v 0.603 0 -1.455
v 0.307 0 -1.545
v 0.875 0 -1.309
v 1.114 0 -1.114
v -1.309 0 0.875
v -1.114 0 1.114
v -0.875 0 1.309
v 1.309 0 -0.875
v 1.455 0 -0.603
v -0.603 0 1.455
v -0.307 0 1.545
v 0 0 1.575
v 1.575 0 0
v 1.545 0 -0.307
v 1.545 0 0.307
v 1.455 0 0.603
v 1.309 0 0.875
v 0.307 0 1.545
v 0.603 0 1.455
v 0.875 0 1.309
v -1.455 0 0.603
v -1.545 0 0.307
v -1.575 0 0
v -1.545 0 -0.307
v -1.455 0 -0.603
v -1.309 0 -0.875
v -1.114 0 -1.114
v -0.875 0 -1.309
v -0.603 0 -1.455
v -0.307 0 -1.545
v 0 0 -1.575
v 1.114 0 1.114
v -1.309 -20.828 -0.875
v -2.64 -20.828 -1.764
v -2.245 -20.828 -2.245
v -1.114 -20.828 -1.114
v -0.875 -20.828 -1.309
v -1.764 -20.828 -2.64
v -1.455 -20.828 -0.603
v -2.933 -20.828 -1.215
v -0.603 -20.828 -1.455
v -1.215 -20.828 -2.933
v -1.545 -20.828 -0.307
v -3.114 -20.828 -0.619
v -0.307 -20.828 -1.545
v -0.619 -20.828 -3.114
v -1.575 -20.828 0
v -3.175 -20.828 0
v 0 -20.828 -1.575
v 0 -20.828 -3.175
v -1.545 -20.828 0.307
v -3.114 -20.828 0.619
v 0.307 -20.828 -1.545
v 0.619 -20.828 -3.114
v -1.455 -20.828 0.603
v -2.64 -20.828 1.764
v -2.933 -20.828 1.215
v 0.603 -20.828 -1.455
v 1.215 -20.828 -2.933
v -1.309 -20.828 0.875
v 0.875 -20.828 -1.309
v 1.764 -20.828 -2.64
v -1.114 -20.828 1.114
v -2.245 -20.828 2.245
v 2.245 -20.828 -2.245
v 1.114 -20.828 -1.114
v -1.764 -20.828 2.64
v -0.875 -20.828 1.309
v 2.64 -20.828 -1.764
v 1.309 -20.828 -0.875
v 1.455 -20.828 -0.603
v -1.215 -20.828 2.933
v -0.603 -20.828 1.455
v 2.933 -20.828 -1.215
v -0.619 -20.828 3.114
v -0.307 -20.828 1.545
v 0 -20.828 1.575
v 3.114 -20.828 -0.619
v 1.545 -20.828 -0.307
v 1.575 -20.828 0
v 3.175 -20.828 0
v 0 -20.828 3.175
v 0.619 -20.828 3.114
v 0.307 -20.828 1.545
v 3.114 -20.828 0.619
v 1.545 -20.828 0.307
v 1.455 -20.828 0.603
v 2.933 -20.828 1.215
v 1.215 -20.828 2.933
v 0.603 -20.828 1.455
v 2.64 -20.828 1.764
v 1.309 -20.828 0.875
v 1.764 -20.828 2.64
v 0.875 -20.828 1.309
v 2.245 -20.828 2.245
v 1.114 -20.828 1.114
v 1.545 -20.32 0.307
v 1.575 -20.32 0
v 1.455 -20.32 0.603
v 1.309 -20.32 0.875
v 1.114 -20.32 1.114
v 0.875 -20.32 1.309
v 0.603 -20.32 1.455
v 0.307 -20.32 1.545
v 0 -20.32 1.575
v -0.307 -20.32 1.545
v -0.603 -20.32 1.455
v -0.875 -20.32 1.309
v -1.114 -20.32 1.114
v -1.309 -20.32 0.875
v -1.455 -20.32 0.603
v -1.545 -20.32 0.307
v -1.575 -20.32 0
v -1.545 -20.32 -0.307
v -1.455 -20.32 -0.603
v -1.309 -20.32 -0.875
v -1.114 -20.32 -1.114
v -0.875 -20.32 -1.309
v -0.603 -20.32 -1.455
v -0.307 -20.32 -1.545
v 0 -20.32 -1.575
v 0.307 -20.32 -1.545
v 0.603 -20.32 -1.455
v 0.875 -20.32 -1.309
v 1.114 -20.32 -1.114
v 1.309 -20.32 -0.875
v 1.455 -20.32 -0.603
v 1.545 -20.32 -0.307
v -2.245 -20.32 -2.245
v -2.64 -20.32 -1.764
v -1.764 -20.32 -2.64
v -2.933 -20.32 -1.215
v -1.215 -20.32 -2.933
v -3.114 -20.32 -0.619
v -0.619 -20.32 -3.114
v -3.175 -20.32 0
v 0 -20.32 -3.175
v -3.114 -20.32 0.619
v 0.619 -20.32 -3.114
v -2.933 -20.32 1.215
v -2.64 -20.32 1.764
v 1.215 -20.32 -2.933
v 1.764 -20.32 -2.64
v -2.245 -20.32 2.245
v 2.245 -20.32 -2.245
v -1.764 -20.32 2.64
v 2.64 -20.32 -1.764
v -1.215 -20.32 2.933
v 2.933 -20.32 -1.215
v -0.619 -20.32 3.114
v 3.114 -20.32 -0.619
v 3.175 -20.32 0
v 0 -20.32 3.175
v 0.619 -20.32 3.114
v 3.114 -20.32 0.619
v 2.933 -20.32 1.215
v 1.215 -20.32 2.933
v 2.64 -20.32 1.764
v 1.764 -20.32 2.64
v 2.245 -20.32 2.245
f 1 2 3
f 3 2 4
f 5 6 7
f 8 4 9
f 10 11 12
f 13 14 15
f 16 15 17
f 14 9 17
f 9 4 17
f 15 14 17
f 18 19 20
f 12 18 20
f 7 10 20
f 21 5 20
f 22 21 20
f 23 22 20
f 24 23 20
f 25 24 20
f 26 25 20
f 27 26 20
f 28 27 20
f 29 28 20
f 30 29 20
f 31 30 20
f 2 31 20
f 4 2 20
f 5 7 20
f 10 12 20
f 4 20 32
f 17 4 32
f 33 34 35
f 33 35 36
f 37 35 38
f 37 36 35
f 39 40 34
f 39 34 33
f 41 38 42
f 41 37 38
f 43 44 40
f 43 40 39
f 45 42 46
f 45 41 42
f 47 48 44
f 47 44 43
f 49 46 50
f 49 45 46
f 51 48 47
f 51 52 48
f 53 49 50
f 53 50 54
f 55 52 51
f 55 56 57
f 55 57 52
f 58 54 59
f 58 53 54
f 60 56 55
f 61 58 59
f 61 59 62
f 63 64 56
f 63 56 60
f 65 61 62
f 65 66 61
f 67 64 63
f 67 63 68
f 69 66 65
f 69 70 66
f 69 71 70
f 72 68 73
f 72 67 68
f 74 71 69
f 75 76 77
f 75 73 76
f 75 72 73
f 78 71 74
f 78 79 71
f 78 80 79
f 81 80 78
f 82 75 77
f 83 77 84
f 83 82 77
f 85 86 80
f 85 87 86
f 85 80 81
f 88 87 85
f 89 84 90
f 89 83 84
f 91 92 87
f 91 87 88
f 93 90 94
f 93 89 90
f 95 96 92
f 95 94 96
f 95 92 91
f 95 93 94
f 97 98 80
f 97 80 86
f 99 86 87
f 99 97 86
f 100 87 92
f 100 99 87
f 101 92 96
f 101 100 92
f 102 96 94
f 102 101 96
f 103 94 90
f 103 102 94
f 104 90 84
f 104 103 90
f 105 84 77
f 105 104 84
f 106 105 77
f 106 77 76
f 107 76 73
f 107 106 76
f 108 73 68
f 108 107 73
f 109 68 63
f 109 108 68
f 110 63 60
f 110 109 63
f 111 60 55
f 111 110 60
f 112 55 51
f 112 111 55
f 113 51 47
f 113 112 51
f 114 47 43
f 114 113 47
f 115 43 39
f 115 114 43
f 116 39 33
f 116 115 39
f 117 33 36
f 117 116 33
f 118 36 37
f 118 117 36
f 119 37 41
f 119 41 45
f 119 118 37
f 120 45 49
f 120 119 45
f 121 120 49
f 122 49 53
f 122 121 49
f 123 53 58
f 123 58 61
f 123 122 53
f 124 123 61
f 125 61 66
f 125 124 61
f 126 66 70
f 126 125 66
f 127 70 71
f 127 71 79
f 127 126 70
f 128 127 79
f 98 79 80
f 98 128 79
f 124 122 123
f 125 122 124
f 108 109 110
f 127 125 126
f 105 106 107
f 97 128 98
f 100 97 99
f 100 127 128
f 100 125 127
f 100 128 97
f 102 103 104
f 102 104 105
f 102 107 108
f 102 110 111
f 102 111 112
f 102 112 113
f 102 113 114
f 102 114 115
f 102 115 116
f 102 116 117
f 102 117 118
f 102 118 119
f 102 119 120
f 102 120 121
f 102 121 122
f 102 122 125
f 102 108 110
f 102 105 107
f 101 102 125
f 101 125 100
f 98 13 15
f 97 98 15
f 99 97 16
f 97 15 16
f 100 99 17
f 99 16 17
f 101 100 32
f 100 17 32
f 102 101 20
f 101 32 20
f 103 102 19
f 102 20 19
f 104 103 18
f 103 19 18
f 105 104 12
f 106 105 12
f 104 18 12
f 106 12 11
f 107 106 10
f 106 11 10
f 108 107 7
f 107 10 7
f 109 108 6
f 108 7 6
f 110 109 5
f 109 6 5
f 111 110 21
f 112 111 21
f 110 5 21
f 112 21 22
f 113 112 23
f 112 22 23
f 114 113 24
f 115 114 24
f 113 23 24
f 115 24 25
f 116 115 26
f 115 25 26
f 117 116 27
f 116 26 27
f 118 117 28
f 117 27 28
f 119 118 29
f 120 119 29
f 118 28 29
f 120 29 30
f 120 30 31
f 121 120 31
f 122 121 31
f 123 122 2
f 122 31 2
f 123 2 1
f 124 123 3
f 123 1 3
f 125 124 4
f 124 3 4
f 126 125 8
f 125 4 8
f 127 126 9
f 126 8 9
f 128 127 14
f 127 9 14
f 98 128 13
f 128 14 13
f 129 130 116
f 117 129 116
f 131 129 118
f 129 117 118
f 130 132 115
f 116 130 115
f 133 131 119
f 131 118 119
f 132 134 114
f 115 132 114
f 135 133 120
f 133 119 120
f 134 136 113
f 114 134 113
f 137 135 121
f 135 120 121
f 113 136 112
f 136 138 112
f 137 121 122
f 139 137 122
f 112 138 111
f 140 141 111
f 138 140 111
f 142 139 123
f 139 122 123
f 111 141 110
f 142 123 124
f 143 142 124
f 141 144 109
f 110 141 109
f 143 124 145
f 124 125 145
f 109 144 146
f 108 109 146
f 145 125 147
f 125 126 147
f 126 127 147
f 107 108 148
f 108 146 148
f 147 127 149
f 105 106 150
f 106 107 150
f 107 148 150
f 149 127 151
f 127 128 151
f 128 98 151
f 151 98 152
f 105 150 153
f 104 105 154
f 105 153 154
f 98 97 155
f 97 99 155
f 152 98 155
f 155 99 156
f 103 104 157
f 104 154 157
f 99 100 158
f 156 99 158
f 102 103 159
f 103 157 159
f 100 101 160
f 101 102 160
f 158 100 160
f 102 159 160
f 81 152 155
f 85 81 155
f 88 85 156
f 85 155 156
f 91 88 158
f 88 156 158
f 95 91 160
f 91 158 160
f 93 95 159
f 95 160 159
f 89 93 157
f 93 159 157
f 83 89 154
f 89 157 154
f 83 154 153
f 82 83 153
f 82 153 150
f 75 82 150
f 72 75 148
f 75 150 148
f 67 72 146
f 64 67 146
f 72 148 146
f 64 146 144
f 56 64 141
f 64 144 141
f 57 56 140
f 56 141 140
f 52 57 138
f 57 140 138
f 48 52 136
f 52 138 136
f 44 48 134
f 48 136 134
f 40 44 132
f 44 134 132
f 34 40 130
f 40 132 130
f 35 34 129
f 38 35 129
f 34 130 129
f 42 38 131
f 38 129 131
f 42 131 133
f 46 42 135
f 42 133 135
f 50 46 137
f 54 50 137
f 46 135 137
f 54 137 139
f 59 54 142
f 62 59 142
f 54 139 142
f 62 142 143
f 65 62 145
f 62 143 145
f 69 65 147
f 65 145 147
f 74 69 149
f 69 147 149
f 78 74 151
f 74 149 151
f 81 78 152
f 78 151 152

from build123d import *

# Parameters (mm, degrees)
F0_R     = 1.5748
F1_DEPTH = 20.32
F2_R     = 3.175
F2_R_2   = 1.5748
F3_DEPTH = 0.508


with BuildPart() as f1:
    # F0 (on Front) → F1 (new body)
    with BuildSketch(Plane.XZ):
        Circle(F0_R)
    extrude(amount=F1_DEPTH)


with BuildPart() as f3:
    # F2 (on face) → F3 (new body)
    with BuildSketch(Plane.XZ.offset(20.32)):
        Circle(F2_R)
        Circle(F2_R_2, mode=Mode.SUBTRACT)
    extrude(amount=F3_DEPTH)


solid = Compound([f1.part, f3.part])
